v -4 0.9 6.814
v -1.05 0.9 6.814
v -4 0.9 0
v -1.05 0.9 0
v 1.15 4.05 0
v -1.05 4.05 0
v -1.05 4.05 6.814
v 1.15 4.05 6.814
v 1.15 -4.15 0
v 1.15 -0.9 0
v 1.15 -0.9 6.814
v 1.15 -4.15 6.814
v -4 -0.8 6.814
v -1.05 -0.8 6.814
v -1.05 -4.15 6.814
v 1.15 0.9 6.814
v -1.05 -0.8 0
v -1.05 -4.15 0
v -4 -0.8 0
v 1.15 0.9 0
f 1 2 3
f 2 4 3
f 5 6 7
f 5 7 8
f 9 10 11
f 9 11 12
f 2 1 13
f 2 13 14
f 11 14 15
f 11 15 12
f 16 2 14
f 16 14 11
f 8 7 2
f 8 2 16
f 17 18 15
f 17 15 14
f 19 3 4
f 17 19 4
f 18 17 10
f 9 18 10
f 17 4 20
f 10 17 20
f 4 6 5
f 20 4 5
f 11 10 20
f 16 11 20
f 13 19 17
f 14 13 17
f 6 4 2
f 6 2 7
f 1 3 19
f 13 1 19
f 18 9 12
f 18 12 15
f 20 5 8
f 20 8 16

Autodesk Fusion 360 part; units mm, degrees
sketch "Sketch1" plane through (0, 0, 0) normal (0, 0, 1) x (1, 0, 0)
  line L0 (-1.05, 4.05) -> (1.15, 4.05)
  line L1 (1.15, 4.05) -> (1.15, -4.15)
  line L2 (1.15, -4.15) -> (-1.05, -4.15)
  line L3 (-1.05, 0.9) -> (-4, 0.9)
  line L4 (-4, 0.9) -> (-4, -0.8)
  line L5 (-4, -0.8) -> (-1.05, -0.8)
  line L6 (1.15, -0.9) -> (1.15, 0.9)
  line L7 (-1.05, -4.15) -> (-1.05, -0.8)
  line L8 (-1.05, 0.9) -> (-1.05, 4.05)
  dimension "d1" = 2.2
  dimension "d2" = 8.2
  dimension "d4" = 4.15
  dimension "d5" = 1.15
  dimension "d6" = 1.7
  dimension "d7" = 0.9
  dimension "d12" = 4
extrude "Extrude1" add sketch "Sketch1" along normal blind 6.814
equation "d1 = 2.5 mm - 0.3 mm"
equation "d2 = 8.60 mm - 0.4 mm"
equation "d4 = ( 8.3 / 2 ) * 1 mm"
equation "d5 = ( 2.3 / 2 ) * 1 mm"
equation "d6 = 2 mm - 0.3 mm"
equation "d7 = ( 1.8 / 2 ) * 1 mm"
equation "d10 = 6.964 mm - 0.15 mm"
equation "d12 = 4.3 mm - 0.3 mm"
